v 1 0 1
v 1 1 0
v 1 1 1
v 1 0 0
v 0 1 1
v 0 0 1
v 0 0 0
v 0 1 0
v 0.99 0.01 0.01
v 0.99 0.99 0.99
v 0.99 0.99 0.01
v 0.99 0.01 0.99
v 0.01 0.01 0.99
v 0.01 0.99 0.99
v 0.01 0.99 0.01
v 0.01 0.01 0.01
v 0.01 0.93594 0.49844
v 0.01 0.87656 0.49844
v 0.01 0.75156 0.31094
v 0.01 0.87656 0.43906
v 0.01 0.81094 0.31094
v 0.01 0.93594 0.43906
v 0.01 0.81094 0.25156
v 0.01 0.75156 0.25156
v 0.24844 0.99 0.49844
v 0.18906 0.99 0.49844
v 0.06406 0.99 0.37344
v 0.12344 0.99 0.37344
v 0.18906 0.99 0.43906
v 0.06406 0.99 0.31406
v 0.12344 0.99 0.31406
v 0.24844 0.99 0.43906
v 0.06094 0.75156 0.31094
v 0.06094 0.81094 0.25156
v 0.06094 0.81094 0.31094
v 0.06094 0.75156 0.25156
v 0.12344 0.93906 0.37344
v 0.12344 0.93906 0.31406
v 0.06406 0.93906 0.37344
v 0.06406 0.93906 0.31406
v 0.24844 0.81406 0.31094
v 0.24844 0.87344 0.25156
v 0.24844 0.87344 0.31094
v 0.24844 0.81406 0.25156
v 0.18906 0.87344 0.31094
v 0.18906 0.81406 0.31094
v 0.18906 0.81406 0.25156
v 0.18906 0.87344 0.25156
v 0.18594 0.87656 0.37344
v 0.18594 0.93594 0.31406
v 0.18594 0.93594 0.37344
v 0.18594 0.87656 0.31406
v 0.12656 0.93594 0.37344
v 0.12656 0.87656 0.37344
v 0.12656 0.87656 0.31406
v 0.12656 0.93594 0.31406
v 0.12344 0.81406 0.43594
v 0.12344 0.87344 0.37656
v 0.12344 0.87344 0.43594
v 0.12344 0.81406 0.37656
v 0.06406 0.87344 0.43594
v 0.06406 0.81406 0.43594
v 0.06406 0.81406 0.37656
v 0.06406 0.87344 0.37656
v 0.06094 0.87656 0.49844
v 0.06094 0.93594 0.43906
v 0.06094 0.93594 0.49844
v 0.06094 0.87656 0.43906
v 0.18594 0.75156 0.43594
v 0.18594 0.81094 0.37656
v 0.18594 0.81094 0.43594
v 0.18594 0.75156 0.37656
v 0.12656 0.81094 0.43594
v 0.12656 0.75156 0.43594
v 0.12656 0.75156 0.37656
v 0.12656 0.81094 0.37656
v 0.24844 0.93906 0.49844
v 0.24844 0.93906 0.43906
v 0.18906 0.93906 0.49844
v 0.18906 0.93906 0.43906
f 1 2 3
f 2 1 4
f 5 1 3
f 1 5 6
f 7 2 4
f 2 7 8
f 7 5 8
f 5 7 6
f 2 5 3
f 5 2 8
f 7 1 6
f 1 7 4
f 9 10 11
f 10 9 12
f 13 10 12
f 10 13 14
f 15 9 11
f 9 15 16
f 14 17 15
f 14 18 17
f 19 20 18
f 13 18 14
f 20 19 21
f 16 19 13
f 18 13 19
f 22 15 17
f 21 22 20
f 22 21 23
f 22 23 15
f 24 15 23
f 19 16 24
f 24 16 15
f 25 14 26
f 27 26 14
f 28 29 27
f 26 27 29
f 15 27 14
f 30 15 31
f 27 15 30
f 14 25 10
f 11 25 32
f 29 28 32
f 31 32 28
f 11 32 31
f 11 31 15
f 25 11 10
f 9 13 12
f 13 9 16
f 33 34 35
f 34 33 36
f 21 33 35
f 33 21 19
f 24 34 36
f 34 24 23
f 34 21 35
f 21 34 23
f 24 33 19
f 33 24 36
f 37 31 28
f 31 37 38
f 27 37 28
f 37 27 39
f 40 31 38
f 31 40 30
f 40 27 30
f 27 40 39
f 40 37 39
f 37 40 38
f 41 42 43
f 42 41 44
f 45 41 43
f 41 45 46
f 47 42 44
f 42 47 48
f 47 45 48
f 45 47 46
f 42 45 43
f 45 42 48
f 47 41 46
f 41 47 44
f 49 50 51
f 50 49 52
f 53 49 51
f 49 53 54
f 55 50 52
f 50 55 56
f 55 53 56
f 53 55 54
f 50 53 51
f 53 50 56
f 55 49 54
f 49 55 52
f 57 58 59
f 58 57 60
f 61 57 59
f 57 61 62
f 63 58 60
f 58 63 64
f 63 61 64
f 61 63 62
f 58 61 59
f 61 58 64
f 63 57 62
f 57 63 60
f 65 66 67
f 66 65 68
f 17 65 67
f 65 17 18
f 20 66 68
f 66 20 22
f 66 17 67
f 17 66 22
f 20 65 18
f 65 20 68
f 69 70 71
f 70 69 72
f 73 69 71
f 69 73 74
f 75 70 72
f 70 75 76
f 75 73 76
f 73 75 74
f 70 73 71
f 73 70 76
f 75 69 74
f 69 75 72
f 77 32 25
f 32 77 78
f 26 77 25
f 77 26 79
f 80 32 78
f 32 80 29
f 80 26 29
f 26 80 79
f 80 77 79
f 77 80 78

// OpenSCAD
translate([0.03125, 0.78125, 0.28125]) color([0.1977229983916683, 0.036370797334404625, 0.13840798504488894]) cube([0.059375, 0.059375, 0.059375], center=true);
translate([0.09375, 0.96875, 0.34375]) color([0.695134065044521, 0.2654011745990712, 0.4635417367699751]) cube([0.059375, 0.059375, 0.059375], center=true);
translate([0.21875, 0.84375, 0.28125]) color([0.14067843926211876, 0.3233092624720053, 0.6766209265725885]) cube([0.059375, 0.059375, 0.059375], center=true);
translate([0.15625, 0.90625, 0.34375]) color([0.5598941248919586, 0.2674263193966361, 0.7715367321750608]) cube([0.059375, 0.059375, 0.059375], center=true);
translate([0.09375, 0.84375, 0.40625]) color([0.7775867750177572, 0.3358457771023752, 0.7984986383285079]) cube([0.059375, 0.059375, 0.059375], center=true);
translate([0.03125, 0.90625, 0.46875]) color([0.3608344962449672, 0.130636609727118, 0.1470050456404287]) cube([0.059375, 0.059375, 0.059375], center=true);
translate([0.15625, 0.78125, 0.40625]) color([0.5817121628313788, 0.46286602772829477, 0.8824527290015699]) cube([0.059375, 0.059375, 0.059375], center=true);
translate([0.21875, 0.96875, 0.46875]) color([0.1201105517589024, 0.1938197880719691, 0.4695931850983104]) cube([0.059375, 0.059375, 0.059375], center=true);
color([0.3,0.3,0.3,0.3]) difference() { cube([1,1,1]); translate([0.01,0.01,0.01]) cube([0.98,0.98,0.98]); }
